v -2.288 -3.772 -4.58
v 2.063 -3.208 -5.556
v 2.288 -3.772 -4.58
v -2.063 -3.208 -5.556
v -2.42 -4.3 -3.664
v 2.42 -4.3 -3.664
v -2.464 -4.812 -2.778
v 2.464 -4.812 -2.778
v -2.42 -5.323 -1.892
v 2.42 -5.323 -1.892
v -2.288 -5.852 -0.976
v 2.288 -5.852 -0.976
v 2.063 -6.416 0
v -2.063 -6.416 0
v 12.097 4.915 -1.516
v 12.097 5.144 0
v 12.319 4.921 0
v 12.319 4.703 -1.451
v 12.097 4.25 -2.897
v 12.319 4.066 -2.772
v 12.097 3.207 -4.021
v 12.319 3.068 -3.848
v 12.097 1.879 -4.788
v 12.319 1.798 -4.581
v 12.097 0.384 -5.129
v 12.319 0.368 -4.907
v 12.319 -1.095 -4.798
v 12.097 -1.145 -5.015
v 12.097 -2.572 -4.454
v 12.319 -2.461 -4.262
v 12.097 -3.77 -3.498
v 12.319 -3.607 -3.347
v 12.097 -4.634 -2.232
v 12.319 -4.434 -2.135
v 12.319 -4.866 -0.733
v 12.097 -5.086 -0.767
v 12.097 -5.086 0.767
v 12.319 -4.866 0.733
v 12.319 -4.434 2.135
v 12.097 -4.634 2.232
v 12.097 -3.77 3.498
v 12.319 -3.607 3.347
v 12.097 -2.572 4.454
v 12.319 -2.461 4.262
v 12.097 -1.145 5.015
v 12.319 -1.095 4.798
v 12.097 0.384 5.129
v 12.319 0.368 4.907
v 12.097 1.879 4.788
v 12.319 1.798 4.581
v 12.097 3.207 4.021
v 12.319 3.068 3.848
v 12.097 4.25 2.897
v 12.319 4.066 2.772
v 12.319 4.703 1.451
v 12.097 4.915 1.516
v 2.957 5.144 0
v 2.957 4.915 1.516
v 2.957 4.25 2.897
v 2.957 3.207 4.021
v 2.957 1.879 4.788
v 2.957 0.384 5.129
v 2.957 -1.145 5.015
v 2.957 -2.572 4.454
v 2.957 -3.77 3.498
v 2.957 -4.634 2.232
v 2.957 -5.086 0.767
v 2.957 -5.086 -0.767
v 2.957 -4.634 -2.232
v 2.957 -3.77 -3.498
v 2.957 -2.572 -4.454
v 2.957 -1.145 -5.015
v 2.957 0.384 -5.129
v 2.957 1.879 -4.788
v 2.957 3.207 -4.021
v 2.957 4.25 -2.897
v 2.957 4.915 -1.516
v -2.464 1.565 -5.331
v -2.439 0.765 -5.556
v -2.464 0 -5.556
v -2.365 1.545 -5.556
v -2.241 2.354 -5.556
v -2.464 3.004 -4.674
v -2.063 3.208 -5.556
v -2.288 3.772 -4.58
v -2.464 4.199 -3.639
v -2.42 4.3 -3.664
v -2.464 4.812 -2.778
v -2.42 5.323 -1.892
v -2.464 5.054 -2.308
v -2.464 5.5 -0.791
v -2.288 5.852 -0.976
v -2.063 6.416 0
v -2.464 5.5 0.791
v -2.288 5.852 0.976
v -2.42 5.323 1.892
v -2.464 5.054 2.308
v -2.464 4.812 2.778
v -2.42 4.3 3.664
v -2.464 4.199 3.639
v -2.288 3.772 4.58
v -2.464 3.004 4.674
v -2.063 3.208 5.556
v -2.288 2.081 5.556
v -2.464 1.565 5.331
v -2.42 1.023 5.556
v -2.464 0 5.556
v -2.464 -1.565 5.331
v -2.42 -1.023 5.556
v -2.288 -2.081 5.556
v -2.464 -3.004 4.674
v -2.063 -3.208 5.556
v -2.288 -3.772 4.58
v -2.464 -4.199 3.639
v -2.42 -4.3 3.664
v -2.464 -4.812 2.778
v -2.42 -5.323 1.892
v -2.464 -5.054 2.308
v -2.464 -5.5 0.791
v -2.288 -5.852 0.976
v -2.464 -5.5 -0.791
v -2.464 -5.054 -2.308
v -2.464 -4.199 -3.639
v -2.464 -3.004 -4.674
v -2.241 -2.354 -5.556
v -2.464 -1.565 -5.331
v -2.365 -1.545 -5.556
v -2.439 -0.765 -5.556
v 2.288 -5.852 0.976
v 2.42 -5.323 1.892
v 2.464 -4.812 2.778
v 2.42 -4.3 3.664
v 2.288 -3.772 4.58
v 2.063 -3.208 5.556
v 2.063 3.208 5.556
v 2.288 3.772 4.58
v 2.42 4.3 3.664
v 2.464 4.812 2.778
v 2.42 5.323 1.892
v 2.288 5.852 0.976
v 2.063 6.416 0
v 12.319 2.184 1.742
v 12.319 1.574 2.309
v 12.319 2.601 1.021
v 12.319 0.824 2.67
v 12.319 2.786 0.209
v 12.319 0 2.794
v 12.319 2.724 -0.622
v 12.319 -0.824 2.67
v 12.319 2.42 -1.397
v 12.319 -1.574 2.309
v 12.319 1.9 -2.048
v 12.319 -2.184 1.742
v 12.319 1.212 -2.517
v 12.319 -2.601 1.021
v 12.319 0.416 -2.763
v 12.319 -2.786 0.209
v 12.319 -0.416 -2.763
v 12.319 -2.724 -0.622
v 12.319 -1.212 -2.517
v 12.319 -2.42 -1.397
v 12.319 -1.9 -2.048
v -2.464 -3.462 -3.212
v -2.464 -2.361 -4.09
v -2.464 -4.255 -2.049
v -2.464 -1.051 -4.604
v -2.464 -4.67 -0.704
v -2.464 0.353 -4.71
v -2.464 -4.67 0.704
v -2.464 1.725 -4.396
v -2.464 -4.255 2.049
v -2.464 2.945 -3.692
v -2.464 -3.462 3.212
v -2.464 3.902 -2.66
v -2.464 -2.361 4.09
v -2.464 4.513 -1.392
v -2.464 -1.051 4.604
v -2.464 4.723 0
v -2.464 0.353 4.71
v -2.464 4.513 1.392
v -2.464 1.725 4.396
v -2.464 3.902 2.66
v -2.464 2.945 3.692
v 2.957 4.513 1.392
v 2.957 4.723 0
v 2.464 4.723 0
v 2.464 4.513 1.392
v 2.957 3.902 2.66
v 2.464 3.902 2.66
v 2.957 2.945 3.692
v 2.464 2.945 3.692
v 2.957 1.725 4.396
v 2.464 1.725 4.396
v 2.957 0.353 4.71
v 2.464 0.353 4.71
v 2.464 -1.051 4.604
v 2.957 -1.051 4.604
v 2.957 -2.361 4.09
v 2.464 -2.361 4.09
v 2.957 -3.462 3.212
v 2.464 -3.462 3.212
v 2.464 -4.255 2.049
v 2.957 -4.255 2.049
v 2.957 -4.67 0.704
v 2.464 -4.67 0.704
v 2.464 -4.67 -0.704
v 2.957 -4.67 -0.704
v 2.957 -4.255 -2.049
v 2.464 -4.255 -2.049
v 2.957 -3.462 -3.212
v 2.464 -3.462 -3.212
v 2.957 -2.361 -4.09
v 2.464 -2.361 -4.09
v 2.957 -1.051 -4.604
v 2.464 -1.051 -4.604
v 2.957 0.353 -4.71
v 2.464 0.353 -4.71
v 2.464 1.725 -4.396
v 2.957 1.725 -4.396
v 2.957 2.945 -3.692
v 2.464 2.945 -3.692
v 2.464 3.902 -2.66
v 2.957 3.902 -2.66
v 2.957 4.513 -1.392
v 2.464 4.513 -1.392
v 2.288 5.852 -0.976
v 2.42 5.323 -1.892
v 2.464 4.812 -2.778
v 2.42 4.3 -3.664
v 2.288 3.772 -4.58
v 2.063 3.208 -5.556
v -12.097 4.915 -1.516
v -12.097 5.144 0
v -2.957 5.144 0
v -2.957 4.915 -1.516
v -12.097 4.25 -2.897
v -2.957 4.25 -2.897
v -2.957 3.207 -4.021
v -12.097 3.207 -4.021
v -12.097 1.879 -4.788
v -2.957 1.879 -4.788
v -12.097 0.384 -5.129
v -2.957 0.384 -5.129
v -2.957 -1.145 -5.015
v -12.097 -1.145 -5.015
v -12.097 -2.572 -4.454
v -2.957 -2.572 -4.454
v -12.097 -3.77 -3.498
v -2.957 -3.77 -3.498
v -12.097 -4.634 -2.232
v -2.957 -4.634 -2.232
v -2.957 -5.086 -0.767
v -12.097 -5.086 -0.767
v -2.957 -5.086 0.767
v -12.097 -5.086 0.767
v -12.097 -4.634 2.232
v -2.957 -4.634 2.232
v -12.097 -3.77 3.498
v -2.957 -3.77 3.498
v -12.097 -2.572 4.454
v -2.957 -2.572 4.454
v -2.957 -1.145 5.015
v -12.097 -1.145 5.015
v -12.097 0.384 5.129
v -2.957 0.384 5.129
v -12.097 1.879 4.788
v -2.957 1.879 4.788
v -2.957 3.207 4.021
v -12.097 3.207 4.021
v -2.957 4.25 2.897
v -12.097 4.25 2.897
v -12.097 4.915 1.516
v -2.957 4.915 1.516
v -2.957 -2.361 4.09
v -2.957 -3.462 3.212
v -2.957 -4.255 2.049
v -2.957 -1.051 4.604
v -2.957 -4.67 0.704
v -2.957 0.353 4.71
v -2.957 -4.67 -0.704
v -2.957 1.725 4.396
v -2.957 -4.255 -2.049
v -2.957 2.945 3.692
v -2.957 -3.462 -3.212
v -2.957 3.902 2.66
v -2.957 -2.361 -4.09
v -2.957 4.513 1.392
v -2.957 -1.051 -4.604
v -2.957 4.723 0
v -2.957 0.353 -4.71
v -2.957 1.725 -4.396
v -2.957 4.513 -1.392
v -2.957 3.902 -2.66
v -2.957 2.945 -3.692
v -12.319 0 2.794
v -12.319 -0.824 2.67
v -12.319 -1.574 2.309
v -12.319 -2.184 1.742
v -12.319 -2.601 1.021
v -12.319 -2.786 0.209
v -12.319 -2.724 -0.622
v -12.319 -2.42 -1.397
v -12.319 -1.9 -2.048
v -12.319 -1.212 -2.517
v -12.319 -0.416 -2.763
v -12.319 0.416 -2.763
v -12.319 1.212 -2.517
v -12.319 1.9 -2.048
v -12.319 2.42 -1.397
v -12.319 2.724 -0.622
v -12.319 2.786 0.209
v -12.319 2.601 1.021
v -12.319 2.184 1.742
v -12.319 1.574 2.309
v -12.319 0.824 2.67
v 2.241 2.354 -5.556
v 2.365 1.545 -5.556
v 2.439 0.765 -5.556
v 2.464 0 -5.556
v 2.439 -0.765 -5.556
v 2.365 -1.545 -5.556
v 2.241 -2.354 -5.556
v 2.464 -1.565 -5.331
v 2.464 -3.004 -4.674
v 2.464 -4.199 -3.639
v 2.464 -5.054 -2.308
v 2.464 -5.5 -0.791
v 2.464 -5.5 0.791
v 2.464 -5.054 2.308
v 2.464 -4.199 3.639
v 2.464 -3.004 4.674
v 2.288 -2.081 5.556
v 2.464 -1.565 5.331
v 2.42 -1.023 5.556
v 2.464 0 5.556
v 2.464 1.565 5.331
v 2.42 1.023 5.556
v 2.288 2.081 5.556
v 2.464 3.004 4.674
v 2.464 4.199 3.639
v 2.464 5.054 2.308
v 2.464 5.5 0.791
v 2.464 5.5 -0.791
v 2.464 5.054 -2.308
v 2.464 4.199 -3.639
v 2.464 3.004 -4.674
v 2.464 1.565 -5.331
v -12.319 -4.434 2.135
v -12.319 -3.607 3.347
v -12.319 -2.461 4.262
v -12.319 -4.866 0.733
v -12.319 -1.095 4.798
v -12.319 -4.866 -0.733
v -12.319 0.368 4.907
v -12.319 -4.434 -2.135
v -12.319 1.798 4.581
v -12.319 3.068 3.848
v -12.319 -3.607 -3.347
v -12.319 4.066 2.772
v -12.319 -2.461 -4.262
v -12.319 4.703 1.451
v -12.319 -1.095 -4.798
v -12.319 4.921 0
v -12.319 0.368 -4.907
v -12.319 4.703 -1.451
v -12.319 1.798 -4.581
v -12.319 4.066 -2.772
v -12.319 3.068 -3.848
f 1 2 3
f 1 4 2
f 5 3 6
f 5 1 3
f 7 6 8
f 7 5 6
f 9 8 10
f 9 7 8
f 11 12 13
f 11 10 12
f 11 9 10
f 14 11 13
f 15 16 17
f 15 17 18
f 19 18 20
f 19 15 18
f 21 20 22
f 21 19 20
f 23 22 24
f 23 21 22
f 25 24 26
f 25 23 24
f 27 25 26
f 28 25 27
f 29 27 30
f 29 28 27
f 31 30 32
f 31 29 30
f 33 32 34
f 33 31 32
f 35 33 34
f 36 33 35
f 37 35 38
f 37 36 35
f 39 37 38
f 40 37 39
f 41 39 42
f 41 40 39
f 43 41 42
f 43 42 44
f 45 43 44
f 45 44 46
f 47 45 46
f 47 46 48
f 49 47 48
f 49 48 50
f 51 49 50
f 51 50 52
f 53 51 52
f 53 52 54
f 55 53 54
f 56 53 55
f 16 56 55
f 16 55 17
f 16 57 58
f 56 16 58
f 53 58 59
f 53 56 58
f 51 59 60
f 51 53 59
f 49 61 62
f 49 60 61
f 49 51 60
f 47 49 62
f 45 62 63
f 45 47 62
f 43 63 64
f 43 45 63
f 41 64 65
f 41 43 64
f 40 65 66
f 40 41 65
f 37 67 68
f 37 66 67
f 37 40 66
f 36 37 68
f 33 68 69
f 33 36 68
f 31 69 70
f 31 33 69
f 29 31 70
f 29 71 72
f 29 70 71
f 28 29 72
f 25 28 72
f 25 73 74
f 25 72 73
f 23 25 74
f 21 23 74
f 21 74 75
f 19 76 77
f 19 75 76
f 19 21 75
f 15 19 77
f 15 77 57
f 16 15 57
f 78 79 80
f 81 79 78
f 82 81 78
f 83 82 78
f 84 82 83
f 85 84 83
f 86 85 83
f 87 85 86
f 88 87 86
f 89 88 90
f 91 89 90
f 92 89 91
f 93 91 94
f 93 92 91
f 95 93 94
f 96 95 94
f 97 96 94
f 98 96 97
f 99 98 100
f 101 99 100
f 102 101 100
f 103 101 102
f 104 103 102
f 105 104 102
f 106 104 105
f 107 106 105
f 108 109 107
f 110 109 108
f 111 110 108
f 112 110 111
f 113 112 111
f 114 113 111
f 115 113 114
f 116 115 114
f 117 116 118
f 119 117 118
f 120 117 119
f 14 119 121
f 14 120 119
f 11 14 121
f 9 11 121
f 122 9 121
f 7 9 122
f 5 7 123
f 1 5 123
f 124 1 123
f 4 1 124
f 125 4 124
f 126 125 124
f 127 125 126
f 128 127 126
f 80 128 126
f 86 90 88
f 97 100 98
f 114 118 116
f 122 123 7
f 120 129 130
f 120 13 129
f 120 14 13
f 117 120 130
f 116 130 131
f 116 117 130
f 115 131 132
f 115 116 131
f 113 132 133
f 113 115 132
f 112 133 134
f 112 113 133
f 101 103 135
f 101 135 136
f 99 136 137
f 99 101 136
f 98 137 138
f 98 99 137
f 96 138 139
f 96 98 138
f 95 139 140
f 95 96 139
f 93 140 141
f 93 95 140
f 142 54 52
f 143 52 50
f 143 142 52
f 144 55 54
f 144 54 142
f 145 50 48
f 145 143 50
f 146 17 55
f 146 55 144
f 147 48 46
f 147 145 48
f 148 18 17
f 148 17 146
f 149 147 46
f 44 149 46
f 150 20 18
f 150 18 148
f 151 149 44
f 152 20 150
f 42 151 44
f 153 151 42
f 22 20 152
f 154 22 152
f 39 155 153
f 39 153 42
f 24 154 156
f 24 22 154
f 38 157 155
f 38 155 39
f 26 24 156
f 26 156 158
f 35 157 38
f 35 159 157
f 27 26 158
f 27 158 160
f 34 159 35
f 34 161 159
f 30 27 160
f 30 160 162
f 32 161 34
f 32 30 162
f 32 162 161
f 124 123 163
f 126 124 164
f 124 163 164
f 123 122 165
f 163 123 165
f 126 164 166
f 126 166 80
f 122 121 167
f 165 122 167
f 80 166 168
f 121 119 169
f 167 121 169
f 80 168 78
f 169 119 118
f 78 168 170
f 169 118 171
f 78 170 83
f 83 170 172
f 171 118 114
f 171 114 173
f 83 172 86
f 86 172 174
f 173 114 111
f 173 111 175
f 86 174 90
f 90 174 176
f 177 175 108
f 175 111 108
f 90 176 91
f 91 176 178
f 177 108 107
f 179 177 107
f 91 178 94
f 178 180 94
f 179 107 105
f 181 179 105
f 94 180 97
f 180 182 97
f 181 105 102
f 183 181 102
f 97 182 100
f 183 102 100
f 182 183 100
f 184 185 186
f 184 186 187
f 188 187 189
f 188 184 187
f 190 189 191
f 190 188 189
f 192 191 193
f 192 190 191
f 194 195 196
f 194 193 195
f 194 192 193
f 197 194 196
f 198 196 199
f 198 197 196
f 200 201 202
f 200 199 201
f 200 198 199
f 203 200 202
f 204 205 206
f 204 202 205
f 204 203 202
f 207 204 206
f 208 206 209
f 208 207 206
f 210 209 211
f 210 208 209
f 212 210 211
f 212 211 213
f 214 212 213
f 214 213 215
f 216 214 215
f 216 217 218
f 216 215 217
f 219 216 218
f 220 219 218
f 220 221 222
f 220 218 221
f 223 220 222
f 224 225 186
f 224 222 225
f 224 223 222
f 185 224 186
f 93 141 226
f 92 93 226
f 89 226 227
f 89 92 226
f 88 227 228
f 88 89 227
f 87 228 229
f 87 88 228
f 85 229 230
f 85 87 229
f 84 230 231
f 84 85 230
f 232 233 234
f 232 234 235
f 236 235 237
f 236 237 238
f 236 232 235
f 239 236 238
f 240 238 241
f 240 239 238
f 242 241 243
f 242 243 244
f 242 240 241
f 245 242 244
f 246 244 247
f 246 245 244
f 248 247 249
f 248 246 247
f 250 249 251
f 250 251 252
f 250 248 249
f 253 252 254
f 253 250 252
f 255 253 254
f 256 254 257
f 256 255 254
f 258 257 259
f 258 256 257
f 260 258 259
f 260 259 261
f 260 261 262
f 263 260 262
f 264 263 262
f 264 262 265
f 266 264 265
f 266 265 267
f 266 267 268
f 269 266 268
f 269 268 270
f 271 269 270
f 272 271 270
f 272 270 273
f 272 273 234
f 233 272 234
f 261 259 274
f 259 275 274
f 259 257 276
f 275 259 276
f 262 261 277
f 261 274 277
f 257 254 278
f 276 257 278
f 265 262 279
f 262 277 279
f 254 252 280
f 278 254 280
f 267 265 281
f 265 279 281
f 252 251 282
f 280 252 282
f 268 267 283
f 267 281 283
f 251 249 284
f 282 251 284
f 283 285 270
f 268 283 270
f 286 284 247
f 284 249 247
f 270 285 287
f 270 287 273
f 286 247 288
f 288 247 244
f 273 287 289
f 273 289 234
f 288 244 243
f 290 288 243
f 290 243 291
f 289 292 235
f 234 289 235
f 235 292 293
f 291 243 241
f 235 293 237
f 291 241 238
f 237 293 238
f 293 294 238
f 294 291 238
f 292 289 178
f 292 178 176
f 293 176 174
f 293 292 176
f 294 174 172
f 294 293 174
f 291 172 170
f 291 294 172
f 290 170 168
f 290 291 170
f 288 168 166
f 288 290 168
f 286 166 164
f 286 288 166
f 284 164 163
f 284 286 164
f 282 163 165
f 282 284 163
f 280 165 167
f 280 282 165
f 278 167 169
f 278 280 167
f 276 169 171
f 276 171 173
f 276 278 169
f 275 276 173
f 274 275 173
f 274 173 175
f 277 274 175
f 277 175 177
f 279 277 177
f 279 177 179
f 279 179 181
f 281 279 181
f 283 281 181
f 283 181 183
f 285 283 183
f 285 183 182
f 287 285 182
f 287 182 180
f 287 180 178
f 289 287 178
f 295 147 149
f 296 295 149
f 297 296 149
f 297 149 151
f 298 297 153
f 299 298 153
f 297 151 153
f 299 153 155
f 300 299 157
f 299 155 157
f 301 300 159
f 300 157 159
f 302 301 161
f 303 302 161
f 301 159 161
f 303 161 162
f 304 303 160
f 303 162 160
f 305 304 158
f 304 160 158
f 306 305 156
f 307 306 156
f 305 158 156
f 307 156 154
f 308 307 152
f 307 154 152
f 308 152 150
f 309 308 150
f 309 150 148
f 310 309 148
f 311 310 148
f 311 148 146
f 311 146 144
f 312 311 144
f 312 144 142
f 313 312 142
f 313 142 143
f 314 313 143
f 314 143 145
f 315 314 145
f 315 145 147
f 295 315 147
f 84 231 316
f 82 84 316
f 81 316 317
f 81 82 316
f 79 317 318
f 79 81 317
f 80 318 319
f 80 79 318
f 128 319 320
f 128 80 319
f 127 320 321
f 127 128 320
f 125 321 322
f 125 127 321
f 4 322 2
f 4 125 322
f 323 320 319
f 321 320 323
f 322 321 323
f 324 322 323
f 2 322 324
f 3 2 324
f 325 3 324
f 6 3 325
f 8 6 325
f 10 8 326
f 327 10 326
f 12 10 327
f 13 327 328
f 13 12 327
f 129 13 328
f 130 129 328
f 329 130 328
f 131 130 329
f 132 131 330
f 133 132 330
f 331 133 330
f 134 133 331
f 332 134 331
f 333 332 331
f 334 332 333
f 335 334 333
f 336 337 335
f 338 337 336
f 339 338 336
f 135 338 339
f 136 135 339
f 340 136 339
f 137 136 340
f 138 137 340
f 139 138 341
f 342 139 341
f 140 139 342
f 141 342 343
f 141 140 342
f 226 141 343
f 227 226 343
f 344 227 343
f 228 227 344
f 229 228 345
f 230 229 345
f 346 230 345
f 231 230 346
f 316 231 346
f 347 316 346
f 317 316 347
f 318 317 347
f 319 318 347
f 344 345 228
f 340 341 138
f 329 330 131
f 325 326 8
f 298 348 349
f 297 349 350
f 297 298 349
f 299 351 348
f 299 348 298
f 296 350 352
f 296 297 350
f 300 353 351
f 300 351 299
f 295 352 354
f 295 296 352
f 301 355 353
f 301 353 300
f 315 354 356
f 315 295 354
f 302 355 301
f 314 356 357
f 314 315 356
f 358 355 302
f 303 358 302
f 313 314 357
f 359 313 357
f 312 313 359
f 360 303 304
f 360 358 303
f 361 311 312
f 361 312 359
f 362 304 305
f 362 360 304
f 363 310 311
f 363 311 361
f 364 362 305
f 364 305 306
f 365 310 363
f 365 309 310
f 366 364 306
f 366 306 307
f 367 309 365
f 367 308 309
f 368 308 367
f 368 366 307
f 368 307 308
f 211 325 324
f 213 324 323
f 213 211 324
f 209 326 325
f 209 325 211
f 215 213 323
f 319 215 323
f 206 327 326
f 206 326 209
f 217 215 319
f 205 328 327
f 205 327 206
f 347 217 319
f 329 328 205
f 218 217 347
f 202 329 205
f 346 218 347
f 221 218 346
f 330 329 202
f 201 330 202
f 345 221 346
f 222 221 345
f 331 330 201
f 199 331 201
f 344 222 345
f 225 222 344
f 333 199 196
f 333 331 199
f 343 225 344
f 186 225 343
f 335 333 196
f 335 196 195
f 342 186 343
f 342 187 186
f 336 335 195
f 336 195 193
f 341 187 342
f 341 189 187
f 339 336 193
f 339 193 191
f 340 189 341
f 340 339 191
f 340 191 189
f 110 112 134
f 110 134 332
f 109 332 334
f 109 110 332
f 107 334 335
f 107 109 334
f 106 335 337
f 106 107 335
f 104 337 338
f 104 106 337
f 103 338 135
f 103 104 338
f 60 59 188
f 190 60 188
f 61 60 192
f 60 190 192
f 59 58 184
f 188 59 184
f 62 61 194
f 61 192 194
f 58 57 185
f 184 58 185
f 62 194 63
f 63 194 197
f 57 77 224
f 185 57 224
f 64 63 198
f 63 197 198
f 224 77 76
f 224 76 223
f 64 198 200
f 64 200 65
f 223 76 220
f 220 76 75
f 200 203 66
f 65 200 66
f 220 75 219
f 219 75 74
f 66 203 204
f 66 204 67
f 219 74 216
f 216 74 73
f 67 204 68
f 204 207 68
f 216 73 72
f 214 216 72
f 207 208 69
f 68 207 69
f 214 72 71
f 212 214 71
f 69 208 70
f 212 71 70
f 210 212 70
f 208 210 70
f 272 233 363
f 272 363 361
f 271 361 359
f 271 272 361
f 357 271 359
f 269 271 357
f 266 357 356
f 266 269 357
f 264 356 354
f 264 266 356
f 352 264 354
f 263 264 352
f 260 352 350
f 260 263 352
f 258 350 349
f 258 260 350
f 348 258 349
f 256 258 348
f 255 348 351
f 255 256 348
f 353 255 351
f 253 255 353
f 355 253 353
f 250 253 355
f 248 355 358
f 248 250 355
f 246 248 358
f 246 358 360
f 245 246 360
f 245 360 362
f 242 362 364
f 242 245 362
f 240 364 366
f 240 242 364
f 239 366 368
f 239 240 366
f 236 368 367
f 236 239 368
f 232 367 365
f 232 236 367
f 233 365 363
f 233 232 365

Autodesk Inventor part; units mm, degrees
ref_plane "YZ Plane" through (0, 0, 0) normal (1, 0, 0) x (0, 1, 0)
ref_plane "XZ Plane" through (0, 0, 0) normal (0, 1, 0) x (-1, 0, 0)
ref_plane "XY Plane" through (0, 0, 0) normal (0, 0, 1) x (1, 0, 0)
sketch "Sketch1" plane through (0, 0, 0) normal (1, 0, 0) x (0, 1, 0)
  line L0 (6.4158, 0) -> (3.2079, -5.5562)
  line L1 (3.2079, -5.5562) -> (-3.2079, -5.5562)
  line L2 (-3.2079, -5.5562) -> (-6.4158, 0)
  line L3 (-6.4158, 0) -> (-3.2079, 5.5563)
  line L4 (-3.2079, 5.5563) -> (3.2079, 5.5563)
  line L5 (3.2079, 5.5563) -> (6.4158, 0)
  point P0 (0, 0)
  point P1 (0, 0)
  dimension "d0" = 11.1125
extrude "Extrusion1" add sketch "Sketch1" along normal mid plane 4.9276
sketch "Sketch2" plane through (0, 0, 0) normal (0, 0, 1) x (1, 0, 0)
  line L0 (0, 0) -> (7.0752, 0)
  line L1 (-2.4638, 0) -> (-12.319, 0)
  line L2 (-2.4638, 0) -> (-2.4638, 4.7228)
  line L3 (-2.4638, 4.7228) -> (-2.9566, 4.7228)
  line L4 (-2.9566, 4.7228) -> (-2.9566, 5.1435)
  line L5 (-2.9566, 5.1435) -> (-12.319, 5.1435)
  line L6 (-12.319, 5.1435) -> (-12.319, 0)
  line L7 (-16.1978, 0) -> (10.954, 0) projected
  line L8 (-2.4638, 3.2079) -> (-2.4638, -3.2079) projected
  dimension "d3" = 9.8552
  dimension "d6" = 9.3624
  dimension "d32" = 10.287
  dimension "d33" = 9.4456
revolve "Revolution1" add sketch "Sketch2" angle 360 about axis through (-2.4638, 0, 0) along (-1, 0, 0)
mirror "Mirror1" about plane through (0, 0, 0) normal (1, 0, 0) of "Revolution1"
sketch "Sketch5" plane through (0, 0, 0) normal (0, 1, 0) x (-1, 0, 0)
  line L0 (2.4638, -5.5562) -> (-2.4638, -5.5562) projected
  line L1 (-2.4638, -5.5562) -> (-2.4638, -11.1125)
  line L2 (-2.4638, -5.5562) -> (0.1271, -11.1125)
  line L3 (-2.4638, -11.1125) -> (0.1271, -11.1125)
  line L4 (0, -12.2237) -> (0, -4.445) projected
  line L5 (3.4493, 0) -> (-3.4493, 0) projected
  dimension "d15" = 5.5563
  dimension "d38" = 25
revolve "Revolution4" cut sketch "Sketch5" angle 360 about axis through (-10, 0, 0) along (1, 0, 0) contours L2 L4 L3 L1 | L2 L3 L4
mirror "Mirror2" about plane through (0, 0, 0) normal (1, 0, 0) of "Revolution4"
chamfer "Chamfer1" distance 0.2223 angle 45 2 edges at (-12.319, -5.1435, 0) (12.319, -5.1435, 0)
hole "Hole1" at (-12.319, 0, 0) direction (1, 0, 0) diameter 5.588 end through all
thread "Rosca1" size "1/8" designation "1/8 - 27 NPT" standard "NPT" full length
thread "Thread2" size "1/16" standard "NPT" full length
equation "\"d0\" = C_HEX"
equation "\"d1\" = 0.2 * L"
equation "\"d3\" = 0.4 * L"
equation "\"d6\" = 0.38 * L"
equation "\"d33\" = 0.85 * C_HEX"
equation "\"d17\" = 0.02 * C_HEX"
equation "\"d22\" = D"
equation "\"d15\" = 0.5 * C_HEX"
equation "\"C_HEX\" = 11.1125"
equation "\"L\" = 24.638"
equation "\"D\" = 5.588"
equation "\"ND1\" = 9.652"
equation "\"Parker_No\" = 1.2345"
properties part number "Boquilla hexagonal 216P de Parker 216P-2" material "Latón, amarillo claro"
